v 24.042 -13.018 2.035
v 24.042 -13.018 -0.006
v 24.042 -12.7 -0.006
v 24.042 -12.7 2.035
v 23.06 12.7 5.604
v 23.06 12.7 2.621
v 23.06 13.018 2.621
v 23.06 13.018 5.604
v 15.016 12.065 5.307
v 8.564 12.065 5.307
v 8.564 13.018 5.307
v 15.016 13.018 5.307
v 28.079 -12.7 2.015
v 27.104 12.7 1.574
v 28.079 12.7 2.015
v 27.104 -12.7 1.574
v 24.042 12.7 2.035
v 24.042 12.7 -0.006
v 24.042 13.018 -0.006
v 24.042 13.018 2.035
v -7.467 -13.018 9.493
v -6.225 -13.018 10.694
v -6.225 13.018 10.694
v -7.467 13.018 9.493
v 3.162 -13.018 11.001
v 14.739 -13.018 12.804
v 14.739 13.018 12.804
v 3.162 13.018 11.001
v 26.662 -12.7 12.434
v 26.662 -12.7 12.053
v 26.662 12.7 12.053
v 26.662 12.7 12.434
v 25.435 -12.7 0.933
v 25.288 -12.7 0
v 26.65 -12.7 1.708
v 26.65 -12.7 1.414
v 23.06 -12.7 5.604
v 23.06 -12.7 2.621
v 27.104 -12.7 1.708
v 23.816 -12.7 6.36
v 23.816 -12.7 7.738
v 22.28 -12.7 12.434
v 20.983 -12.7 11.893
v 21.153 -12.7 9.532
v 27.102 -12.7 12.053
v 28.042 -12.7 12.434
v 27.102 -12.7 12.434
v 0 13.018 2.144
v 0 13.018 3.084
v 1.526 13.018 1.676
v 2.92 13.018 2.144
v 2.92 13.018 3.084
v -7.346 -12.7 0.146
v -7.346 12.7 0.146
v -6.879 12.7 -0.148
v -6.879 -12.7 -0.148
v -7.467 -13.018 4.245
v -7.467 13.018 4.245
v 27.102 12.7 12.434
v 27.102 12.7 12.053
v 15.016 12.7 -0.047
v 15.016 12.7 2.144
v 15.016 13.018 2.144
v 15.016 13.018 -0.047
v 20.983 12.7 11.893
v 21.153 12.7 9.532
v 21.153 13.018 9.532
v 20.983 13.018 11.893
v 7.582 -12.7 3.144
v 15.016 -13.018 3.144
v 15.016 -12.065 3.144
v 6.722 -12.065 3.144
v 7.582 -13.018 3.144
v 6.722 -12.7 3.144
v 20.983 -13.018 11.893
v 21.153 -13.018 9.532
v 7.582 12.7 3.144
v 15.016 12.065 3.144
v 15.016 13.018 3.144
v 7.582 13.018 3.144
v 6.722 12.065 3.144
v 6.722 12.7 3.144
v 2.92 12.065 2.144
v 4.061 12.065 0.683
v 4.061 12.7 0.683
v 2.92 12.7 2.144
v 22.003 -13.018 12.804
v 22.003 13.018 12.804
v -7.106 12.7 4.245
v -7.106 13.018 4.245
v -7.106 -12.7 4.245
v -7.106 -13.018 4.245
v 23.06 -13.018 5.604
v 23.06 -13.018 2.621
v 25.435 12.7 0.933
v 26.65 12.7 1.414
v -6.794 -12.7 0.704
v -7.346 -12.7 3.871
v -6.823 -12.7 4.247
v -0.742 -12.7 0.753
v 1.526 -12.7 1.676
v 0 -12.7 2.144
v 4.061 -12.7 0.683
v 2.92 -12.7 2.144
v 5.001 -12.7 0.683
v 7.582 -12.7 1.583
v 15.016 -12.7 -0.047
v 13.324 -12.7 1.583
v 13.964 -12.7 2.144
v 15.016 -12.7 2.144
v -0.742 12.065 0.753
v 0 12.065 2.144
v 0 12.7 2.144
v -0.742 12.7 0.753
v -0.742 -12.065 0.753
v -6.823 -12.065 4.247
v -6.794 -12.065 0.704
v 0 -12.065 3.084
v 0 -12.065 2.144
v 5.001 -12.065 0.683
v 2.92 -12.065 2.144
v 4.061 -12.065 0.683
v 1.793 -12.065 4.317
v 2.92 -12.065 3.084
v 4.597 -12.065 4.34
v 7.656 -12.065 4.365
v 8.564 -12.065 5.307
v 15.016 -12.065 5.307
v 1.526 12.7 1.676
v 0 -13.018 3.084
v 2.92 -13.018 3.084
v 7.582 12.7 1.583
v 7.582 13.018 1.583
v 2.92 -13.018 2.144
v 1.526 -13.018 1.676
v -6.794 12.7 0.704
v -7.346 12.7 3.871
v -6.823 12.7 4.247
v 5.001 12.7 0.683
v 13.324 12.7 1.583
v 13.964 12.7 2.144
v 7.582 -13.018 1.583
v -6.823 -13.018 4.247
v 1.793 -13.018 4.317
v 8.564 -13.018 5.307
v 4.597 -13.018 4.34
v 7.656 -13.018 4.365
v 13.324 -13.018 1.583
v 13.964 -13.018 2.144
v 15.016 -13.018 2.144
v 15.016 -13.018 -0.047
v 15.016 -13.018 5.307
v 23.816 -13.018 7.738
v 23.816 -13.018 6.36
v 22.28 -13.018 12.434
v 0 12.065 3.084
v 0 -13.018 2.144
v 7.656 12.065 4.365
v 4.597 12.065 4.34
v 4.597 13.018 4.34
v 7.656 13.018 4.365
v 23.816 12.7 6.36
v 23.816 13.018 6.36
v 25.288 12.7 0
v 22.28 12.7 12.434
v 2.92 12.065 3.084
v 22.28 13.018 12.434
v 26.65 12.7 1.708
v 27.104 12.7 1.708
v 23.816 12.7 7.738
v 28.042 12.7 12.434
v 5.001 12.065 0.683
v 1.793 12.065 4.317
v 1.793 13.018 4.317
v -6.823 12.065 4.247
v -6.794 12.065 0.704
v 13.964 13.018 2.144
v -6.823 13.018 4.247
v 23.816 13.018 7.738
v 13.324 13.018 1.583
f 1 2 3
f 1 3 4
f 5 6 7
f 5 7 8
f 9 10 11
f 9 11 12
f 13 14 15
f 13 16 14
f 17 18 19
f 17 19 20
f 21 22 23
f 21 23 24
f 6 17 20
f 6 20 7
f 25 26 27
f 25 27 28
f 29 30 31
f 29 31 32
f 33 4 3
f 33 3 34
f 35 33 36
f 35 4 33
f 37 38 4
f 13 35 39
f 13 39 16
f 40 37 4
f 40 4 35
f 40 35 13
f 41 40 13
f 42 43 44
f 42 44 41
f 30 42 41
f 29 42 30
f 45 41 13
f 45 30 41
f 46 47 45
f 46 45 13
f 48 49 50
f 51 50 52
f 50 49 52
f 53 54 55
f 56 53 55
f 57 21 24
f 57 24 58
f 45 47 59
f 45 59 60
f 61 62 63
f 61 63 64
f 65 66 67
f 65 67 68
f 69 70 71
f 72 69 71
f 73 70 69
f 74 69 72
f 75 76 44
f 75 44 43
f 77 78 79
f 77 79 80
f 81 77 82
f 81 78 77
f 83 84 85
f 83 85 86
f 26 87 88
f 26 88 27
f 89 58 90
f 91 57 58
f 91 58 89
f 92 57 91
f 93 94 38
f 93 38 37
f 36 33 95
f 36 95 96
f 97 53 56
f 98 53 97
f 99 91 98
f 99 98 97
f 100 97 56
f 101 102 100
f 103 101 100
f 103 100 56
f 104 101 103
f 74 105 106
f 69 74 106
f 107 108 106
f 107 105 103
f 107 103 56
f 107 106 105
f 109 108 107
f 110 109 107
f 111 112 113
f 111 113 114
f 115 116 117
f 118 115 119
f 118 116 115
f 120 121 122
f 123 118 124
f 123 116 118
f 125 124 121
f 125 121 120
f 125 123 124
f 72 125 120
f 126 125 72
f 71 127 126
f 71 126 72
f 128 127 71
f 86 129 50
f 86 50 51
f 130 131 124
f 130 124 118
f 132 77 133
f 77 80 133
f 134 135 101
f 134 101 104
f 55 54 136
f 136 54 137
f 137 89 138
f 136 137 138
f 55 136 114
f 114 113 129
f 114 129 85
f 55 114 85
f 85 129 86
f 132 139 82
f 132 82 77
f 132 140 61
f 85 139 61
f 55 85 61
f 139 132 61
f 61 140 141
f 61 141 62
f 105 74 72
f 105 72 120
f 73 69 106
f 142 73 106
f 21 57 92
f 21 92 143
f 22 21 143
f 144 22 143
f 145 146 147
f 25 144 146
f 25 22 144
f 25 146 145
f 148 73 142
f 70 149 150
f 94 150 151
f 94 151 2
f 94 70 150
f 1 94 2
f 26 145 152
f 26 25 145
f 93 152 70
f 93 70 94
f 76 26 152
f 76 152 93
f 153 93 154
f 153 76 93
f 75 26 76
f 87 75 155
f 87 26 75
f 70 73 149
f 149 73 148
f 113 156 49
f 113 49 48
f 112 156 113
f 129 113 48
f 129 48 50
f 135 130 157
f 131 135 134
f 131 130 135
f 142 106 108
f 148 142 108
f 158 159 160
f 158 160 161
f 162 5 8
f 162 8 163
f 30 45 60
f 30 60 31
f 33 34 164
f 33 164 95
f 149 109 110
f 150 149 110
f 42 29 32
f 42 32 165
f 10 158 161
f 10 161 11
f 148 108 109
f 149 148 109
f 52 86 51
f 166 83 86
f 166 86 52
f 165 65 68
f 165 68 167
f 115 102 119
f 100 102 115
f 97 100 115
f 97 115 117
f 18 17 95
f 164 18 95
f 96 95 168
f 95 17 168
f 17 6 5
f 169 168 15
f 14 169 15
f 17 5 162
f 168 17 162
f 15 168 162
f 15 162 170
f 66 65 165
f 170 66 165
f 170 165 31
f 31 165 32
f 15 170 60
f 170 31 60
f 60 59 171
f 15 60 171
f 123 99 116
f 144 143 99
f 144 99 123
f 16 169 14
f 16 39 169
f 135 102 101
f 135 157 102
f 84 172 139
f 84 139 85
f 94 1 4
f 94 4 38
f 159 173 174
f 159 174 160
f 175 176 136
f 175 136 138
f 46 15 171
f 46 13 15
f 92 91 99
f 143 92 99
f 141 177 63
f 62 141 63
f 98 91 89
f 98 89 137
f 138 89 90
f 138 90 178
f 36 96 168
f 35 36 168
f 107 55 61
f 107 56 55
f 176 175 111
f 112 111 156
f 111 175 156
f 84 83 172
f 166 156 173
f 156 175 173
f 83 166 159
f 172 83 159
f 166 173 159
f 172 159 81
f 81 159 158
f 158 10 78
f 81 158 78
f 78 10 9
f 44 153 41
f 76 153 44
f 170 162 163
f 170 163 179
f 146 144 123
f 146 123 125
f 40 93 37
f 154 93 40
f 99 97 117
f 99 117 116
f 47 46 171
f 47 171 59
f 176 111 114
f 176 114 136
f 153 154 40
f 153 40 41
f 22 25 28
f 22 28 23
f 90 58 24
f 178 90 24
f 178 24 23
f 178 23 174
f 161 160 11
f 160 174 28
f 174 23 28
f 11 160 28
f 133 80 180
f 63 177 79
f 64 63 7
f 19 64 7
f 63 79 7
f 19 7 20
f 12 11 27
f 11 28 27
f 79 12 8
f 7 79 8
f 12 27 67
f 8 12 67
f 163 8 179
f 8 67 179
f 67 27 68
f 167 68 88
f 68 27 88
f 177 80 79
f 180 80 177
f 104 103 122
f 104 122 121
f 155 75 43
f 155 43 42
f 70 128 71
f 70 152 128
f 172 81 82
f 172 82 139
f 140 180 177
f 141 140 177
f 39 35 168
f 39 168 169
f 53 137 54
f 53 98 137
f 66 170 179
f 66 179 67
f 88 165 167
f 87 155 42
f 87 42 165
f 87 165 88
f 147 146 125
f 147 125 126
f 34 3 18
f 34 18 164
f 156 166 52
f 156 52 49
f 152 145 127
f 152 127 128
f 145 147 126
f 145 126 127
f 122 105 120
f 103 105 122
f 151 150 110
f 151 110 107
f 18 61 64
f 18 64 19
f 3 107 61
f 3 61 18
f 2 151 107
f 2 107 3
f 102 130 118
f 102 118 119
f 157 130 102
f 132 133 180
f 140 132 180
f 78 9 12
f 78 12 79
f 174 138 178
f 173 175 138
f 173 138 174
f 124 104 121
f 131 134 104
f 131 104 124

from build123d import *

# Parameters (mm, degrees)
F1_DEPTH = 12.7
F2_DEPTH = 13.0175
F3_DEPTH = 12.065
F4_DEPTH = 13.0175
F5_DEPTH = 13.0175
F6_DEPTH = 12.7


with BuildPart() as f1:
    # F0 (on Front) → F1 (new body, symmetric)
    with BuildSketch(Plane.XZ):
        Polygon((28.078623, 2.014946), (28.042302, 12.433615), (27.101992, 12.433615), (27.101992, 12.053489), (26.661847, 12.053489), (26.661847, 12.433615), (22.280401, 12.433615), (20.983042, 11.892567), (21.152996, 9.532103), (23.8156, 7.73815), (23.8156, 6.359639), (23.060251, 5.60429), (23.060251, 2.620663), (24.042204, 2.035267), (24.042204, -0.005739), (25.287887, 0), (25.434768, 0.933369), (26.649874, 1.414069), (26.649874, 1.707831), (27.103869, 1.707831), (27.103869, 1.574303), align=None)
    extrude(amount=F1_DEPTH, both=True)

    # F0 (on Front) → F2 (join, symmetric)
    with BuildSketch(Plane.XZ):
        Polygon((20.983042, 11.892567), (22.280401, 12.433615), (22.003097, 12.804012), (14.739173, 12.804012), (3.162292, 11.001383), (-6.224729, 10.694268), (-7.46654, 9.492517), (-7.46654, 4.244864), (-7.106014, 4.244864), (-6.822593, 4.247176), (1.793046, 4.317466), (1.793046, 5.308367), (2.968092, 5.895891), (4.589082, 5.333918), (4.597188, 4.340344), (7.655644, 4.365296), (8.564113, 5.307411), (15.015916, 5.307411), (15.015916, 3.14395), (15.015916, 2.14362), (15.015916, -0.047328), (24.042204, -0.005739), (24.042204, 2.035267), (23.060251, 2.620663), (23.060251, 5.60429), (23.8156, 6.359639), (23.8156, 7.73815), (21.152996, 9.532103), align=None)
    extrude(amount=F2_DEPTH, both=True)

    # F0 (on Front) → F3 (join, symmetric)
    with BuildSketch(Plane.XZ):
        Polygon((7.581856, 3.14395), (15.015916, 3.14395), (15.015916, 5.307411), (8.564113, 5.307411), (7.655644, 4.365296), (4.597188, 4.340344), (1.793046, 4.317466), (-6.822593, 4.247176), (-6.793687, 0.704036), (-0.741626, 0.753411), (0, 2.14362), (0, 3.08393), (2.920319, 3.08393), (2.920319, 2.14362), (4.060694, 0.683138), (5.001005, 0.683138), (6.721572, 3.14395), align=None)
    extrude(amount=F3_DEPTH, both=True)

    # F0 (on Front) → F4 (join, symmetric)
    with BuildSketch(Plane.XZ):
        Polygon((13.963961, 2.14362), (15.015916, 2.14362), (15.015916, 3.14395), (7.581856, 3.14395), (7.581856, 1.583435), (13.323751, 1.583435), align=None)
        Polygon((0, 3.08393), (0, 2.14362), (1.525989, 1.676405), (2.920319, 2.14362), (2.920319, 3.08393), align=None)
    extrude(amount=F4_DEPTH, both=True)

    # F0 (on Front) → F5 (join, symmetric)
    with BuildSketch(Plane.XZ):
        Polygon((1.793046, 5.308367), (1.793046, 4.317466), (4.597188, 4.340344), (4.589082, 5.333918), (2.968092, 5.895891), align=None)
    extrude(amount=F5_DEPTH, both=True)

    # F0 (on Front) → F6 (join, symmetric)
    with BuildSketch(Plane.XZ):
        Polygon((-6.879017, -0.148209), (15.015916, -0.047328), (15.015916, 2.14362), (13.963961, 2.14362), (13.323751, 1.583435), (7.581856, 1.583435), (7.581856, 3.14395), (6.721572, 3.14395), (5.001005, 0.683138), (4.060694, 0.683138), (2.920319, 2.14362), (1.525989, 1.676405), (0, 2.14362), (-0.741626, 0.753411), (-6.793687, 0.704036), (-6.822593, 4.247176), (-7.106014, 4.244864), (-7.346365, 3.870985), (-7.346365, 0.145553), align=None)
    extrude(amount=F6_DEPTH, both=True)


solid = f1.part
